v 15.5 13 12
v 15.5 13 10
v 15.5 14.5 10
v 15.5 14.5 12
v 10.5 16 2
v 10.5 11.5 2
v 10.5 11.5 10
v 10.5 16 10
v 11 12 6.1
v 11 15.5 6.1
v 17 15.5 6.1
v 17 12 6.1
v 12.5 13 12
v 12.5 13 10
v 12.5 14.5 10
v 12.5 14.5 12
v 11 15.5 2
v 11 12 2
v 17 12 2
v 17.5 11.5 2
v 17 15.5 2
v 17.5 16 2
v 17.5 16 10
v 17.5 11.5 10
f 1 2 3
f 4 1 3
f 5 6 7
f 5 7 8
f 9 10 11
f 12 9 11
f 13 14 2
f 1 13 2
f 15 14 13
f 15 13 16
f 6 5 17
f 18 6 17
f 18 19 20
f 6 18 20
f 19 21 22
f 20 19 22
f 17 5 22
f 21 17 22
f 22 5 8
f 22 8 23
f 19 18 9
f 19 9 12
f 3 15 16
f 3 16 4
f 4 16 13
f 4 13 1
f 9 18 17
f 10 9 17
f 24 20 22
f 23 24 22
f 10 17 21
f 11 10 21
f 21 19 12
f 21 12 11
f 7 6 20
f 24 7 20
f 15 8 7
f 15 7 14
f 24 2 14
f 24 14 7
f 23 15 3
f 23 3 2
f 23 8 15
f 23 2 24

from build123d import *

# Parameters (mm, degrees)
BOX003_W     = 3
BOX003_H     = 1.5
BOX003_DEPTH = 2
BOX001_W     = 6
BOX001_H     = 3.5
BOX001_DEPTH = 4.5
BOX002_W     = 7
BOX002_H     = 4.5
BOX002_DEPTH = 8


with BuildPart() as cube002:
    # Box003 → Box003 (new body)
    with BuildSketch(Plane(origin=(12.5, 13, 10), x_dir=(1, 0, 0), z_dir=(0, 0, 1))):
        with Locations((1.5, 0.75)):
            Rectangle(BOX003_W, BOX003_H)
    extrude(amount=BOX003_DEPTH)


with BuildPart() as cube:
    # Box001 → Box001 (new body)
    with BuildSketch(Plane(origin=(11, 12, 1.6), x_dir=(1, 0, 0), z_dir=(0, 0, 1))):
        with Locations((3, 1.75)):
            Rectangle(BOX001_W, BOX001_H)
    extrude(amount=BOX001_DEPTH)


with BuildPart() as button_extn001:
    # Box002 → Box002 (new body)
    with BuildSketch(Plane(origin=(10.5, 11.5, 2), x_dir=(1, 0, 0), z_dir=(0, 0, 1))):
        with Locations((3.5, 2.25)):
            Rectangle(BOX002_W, BOX002_H)
    extrude(amount=BOX002_DEPTH)

    # Cut: cut Cube
    add(cube.part, mode=Mode.SUBTRACT)

    # Fusion: union Cube002
    add(cube002.part)


solid = button_extn001.part
